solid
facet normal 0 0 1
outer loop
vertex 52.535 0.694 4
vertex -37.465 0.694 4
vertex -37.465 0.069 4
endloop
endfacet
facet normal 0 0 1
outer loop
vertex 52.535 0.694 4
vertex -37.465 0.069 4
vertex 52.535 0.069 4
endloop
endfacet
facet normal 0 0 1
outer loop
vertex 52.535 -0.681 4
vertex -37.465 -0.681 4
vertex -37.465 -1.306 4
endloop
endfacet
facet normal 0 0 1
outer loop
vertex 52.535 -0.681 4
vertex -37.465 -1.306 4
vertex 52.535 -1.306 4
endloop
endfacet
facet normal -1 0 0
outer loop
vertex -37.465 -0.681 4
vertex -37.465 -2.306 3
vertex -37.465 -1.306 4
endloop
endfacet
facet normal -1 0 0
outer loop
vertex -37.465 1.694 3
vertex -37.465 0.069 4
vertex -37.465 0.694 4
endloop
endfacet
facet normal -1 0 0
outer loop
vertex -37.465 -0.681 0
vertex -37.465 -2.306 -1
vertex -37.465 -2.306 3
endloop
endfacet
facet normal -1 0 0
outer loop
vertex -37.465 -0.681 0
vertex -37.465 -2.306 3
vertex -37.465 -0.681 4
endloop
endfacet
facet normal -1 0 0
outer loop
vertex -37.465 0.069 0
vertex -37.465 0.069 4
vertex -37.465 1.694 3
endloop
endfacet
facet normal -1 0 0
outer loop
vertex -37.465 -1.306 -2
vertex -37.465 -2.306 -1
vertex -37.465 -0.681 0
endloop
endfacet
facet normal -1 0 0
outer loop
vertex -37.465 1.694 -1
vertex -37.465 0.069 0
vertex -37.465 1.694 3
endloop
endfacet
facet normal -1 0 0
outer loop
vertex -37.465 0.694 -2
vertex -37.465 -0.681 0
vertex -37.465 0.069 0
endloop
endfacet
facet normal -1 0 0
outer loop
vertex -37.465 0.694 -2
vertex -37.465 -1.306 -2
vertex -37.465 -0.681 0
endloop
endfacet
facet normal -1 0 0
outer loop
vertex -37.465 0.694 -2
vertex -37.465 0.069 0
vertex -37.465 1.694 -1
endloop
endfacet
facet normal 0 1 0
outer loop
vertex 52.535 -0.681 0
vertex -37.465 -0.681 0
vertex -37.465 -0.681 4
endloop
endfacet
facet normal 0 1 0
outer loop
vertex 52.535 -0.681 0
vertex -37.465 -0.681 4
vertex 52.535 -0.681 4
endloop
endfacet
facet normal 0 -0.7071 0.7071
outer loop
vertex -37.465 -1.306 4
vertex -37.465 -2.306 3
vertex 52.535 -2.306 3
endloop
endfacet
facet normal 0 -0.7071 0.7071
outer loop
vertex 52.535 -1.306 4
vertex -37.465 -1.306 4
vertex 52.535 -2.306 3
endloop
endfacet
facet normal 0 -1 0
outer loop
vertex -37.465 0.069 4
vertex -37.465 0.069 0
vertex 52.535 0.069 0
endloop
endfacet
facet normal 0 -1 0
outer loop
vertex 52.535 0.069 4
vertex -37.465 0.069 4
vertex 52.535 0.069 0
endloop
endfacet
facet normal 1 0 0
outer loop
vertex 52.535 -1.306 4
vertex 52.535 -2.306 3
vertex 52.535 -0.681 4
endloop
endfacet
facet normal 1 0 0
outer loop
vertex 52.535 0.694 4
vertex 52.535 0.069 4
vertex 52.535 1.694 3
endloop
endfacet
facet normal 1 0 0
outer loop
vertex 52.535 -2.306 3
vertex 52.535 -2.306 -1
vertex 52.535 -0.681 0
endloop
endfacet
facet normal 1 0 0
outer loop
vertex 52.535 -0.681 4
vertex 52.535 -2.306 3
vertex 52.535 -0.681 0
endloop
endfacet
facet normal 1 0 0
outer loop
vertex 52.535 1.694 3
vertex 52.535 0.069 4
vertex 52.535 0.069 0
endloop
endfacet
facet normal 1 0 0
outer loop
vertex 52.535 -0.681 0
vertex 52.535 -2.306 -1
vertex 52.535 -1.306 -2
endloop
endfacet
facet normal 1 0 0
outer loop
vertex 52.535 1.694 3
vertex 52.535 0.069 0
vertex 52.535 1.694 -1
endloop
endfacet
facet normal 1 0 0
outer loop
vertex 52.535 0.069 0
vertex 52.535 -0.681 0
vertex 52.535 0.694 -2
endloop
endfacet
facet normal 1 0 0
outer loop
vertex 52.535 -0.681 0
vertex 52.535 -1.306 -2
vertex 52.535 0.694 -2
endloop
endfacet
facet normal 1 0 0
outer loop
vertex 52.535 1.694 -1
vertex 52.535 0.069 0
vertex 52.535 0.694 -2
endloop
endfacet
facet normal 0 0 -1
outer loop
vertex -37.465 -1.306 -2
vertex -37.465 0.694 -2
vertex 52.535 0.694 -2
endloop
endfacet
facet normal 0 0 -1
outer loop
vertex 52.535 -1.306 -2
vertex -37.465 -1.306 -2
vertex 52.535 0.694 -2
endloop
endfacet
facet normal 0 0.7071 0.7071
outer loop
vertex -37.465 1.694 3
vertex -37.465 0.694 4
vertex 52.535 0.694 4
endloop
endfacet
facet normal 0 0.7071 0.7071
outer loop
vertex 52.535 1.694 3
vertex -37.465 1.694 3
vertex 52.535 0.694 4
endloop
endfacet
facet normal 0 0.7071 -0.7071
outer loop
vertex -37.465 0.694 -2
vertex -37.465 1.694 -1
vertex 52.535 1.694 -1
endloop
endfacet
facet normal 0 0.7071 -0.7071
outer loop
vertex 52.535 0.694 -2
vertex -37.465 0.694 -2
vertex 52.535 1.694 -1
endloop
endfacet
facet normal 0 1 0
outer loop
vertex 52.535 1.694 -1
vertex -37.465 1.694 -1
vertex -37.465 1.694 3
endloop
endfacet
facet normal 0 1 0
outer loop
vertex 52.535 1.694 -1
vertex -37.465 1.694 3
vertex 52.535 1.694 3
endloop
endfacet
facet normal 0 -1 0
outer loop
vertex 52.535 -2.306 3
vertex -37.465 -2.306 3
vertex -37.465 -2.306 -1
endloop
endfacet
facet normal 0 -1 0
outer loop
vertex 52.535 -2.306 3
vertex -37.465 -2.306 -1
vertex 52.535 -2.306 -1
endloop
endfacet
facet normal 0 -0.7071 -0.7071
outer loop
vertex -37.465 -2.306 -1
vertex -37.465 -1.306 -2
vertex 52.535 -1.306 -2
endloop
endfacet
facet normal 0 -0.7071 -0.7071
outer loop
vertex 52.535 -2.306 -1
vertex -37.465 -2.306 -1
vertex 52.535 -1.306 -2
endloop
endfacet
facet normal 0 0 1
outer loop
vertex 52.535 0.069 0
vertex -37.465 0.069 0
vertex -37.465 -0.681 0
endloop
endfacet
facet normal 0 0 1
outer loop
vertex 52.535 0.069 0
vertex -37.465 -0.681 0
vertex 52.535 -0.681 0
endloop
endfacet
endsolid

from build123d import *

# Parameters (mm, degrees)
F0_W     = 90
F0_H     = 1.625
F0_H_2   = 0.75
F1_DEPTH = 2
F2_DEPTH = 4
F3_SIZE2 = 1
F3_SIZE  = 1


with BuildPart() as f1:
    # F0 (on Top) → F1 (new body)
    with BuildSketch(Plane.XY):
        with Locations((7.534994, -1.493563)):
            Rectangle(F0_W, F0_H)
        with Locations((7.534994, -0.306063)):
            Rectangle(F0_W, F0_H_2)
        with Locations((7.534994, 0.881437)):
            Rectangle(F0_W, F0_H)
    extrude(amount=-F1_DEPTH)

    # F0 (on Top) → F2 (join)
    with BuildSketch(Plane.XY):
        with Locations((7.534994, 0.881437)):
            Rectangle(F0_W, F0_H)
        with Locations((7.534994, -1.493563)):
            Rectangle(F0_W, F0_H)
    extrude(amount=F2_DEPTH)

    # F3
    f3_edges = [f1.edges().sort_by_distance(p)[0] for p in [
        (7.534994, 1.693937, -2),
        (7.534994, -2.306063, -2),
        (7.534994, 1.693937, 4),
        (7.534994, -2.306063, 4),
    ]]
    chamfer(f3_edges, length=F3_SIZE, length2=F3_SIZE2)


solid = f1.part
